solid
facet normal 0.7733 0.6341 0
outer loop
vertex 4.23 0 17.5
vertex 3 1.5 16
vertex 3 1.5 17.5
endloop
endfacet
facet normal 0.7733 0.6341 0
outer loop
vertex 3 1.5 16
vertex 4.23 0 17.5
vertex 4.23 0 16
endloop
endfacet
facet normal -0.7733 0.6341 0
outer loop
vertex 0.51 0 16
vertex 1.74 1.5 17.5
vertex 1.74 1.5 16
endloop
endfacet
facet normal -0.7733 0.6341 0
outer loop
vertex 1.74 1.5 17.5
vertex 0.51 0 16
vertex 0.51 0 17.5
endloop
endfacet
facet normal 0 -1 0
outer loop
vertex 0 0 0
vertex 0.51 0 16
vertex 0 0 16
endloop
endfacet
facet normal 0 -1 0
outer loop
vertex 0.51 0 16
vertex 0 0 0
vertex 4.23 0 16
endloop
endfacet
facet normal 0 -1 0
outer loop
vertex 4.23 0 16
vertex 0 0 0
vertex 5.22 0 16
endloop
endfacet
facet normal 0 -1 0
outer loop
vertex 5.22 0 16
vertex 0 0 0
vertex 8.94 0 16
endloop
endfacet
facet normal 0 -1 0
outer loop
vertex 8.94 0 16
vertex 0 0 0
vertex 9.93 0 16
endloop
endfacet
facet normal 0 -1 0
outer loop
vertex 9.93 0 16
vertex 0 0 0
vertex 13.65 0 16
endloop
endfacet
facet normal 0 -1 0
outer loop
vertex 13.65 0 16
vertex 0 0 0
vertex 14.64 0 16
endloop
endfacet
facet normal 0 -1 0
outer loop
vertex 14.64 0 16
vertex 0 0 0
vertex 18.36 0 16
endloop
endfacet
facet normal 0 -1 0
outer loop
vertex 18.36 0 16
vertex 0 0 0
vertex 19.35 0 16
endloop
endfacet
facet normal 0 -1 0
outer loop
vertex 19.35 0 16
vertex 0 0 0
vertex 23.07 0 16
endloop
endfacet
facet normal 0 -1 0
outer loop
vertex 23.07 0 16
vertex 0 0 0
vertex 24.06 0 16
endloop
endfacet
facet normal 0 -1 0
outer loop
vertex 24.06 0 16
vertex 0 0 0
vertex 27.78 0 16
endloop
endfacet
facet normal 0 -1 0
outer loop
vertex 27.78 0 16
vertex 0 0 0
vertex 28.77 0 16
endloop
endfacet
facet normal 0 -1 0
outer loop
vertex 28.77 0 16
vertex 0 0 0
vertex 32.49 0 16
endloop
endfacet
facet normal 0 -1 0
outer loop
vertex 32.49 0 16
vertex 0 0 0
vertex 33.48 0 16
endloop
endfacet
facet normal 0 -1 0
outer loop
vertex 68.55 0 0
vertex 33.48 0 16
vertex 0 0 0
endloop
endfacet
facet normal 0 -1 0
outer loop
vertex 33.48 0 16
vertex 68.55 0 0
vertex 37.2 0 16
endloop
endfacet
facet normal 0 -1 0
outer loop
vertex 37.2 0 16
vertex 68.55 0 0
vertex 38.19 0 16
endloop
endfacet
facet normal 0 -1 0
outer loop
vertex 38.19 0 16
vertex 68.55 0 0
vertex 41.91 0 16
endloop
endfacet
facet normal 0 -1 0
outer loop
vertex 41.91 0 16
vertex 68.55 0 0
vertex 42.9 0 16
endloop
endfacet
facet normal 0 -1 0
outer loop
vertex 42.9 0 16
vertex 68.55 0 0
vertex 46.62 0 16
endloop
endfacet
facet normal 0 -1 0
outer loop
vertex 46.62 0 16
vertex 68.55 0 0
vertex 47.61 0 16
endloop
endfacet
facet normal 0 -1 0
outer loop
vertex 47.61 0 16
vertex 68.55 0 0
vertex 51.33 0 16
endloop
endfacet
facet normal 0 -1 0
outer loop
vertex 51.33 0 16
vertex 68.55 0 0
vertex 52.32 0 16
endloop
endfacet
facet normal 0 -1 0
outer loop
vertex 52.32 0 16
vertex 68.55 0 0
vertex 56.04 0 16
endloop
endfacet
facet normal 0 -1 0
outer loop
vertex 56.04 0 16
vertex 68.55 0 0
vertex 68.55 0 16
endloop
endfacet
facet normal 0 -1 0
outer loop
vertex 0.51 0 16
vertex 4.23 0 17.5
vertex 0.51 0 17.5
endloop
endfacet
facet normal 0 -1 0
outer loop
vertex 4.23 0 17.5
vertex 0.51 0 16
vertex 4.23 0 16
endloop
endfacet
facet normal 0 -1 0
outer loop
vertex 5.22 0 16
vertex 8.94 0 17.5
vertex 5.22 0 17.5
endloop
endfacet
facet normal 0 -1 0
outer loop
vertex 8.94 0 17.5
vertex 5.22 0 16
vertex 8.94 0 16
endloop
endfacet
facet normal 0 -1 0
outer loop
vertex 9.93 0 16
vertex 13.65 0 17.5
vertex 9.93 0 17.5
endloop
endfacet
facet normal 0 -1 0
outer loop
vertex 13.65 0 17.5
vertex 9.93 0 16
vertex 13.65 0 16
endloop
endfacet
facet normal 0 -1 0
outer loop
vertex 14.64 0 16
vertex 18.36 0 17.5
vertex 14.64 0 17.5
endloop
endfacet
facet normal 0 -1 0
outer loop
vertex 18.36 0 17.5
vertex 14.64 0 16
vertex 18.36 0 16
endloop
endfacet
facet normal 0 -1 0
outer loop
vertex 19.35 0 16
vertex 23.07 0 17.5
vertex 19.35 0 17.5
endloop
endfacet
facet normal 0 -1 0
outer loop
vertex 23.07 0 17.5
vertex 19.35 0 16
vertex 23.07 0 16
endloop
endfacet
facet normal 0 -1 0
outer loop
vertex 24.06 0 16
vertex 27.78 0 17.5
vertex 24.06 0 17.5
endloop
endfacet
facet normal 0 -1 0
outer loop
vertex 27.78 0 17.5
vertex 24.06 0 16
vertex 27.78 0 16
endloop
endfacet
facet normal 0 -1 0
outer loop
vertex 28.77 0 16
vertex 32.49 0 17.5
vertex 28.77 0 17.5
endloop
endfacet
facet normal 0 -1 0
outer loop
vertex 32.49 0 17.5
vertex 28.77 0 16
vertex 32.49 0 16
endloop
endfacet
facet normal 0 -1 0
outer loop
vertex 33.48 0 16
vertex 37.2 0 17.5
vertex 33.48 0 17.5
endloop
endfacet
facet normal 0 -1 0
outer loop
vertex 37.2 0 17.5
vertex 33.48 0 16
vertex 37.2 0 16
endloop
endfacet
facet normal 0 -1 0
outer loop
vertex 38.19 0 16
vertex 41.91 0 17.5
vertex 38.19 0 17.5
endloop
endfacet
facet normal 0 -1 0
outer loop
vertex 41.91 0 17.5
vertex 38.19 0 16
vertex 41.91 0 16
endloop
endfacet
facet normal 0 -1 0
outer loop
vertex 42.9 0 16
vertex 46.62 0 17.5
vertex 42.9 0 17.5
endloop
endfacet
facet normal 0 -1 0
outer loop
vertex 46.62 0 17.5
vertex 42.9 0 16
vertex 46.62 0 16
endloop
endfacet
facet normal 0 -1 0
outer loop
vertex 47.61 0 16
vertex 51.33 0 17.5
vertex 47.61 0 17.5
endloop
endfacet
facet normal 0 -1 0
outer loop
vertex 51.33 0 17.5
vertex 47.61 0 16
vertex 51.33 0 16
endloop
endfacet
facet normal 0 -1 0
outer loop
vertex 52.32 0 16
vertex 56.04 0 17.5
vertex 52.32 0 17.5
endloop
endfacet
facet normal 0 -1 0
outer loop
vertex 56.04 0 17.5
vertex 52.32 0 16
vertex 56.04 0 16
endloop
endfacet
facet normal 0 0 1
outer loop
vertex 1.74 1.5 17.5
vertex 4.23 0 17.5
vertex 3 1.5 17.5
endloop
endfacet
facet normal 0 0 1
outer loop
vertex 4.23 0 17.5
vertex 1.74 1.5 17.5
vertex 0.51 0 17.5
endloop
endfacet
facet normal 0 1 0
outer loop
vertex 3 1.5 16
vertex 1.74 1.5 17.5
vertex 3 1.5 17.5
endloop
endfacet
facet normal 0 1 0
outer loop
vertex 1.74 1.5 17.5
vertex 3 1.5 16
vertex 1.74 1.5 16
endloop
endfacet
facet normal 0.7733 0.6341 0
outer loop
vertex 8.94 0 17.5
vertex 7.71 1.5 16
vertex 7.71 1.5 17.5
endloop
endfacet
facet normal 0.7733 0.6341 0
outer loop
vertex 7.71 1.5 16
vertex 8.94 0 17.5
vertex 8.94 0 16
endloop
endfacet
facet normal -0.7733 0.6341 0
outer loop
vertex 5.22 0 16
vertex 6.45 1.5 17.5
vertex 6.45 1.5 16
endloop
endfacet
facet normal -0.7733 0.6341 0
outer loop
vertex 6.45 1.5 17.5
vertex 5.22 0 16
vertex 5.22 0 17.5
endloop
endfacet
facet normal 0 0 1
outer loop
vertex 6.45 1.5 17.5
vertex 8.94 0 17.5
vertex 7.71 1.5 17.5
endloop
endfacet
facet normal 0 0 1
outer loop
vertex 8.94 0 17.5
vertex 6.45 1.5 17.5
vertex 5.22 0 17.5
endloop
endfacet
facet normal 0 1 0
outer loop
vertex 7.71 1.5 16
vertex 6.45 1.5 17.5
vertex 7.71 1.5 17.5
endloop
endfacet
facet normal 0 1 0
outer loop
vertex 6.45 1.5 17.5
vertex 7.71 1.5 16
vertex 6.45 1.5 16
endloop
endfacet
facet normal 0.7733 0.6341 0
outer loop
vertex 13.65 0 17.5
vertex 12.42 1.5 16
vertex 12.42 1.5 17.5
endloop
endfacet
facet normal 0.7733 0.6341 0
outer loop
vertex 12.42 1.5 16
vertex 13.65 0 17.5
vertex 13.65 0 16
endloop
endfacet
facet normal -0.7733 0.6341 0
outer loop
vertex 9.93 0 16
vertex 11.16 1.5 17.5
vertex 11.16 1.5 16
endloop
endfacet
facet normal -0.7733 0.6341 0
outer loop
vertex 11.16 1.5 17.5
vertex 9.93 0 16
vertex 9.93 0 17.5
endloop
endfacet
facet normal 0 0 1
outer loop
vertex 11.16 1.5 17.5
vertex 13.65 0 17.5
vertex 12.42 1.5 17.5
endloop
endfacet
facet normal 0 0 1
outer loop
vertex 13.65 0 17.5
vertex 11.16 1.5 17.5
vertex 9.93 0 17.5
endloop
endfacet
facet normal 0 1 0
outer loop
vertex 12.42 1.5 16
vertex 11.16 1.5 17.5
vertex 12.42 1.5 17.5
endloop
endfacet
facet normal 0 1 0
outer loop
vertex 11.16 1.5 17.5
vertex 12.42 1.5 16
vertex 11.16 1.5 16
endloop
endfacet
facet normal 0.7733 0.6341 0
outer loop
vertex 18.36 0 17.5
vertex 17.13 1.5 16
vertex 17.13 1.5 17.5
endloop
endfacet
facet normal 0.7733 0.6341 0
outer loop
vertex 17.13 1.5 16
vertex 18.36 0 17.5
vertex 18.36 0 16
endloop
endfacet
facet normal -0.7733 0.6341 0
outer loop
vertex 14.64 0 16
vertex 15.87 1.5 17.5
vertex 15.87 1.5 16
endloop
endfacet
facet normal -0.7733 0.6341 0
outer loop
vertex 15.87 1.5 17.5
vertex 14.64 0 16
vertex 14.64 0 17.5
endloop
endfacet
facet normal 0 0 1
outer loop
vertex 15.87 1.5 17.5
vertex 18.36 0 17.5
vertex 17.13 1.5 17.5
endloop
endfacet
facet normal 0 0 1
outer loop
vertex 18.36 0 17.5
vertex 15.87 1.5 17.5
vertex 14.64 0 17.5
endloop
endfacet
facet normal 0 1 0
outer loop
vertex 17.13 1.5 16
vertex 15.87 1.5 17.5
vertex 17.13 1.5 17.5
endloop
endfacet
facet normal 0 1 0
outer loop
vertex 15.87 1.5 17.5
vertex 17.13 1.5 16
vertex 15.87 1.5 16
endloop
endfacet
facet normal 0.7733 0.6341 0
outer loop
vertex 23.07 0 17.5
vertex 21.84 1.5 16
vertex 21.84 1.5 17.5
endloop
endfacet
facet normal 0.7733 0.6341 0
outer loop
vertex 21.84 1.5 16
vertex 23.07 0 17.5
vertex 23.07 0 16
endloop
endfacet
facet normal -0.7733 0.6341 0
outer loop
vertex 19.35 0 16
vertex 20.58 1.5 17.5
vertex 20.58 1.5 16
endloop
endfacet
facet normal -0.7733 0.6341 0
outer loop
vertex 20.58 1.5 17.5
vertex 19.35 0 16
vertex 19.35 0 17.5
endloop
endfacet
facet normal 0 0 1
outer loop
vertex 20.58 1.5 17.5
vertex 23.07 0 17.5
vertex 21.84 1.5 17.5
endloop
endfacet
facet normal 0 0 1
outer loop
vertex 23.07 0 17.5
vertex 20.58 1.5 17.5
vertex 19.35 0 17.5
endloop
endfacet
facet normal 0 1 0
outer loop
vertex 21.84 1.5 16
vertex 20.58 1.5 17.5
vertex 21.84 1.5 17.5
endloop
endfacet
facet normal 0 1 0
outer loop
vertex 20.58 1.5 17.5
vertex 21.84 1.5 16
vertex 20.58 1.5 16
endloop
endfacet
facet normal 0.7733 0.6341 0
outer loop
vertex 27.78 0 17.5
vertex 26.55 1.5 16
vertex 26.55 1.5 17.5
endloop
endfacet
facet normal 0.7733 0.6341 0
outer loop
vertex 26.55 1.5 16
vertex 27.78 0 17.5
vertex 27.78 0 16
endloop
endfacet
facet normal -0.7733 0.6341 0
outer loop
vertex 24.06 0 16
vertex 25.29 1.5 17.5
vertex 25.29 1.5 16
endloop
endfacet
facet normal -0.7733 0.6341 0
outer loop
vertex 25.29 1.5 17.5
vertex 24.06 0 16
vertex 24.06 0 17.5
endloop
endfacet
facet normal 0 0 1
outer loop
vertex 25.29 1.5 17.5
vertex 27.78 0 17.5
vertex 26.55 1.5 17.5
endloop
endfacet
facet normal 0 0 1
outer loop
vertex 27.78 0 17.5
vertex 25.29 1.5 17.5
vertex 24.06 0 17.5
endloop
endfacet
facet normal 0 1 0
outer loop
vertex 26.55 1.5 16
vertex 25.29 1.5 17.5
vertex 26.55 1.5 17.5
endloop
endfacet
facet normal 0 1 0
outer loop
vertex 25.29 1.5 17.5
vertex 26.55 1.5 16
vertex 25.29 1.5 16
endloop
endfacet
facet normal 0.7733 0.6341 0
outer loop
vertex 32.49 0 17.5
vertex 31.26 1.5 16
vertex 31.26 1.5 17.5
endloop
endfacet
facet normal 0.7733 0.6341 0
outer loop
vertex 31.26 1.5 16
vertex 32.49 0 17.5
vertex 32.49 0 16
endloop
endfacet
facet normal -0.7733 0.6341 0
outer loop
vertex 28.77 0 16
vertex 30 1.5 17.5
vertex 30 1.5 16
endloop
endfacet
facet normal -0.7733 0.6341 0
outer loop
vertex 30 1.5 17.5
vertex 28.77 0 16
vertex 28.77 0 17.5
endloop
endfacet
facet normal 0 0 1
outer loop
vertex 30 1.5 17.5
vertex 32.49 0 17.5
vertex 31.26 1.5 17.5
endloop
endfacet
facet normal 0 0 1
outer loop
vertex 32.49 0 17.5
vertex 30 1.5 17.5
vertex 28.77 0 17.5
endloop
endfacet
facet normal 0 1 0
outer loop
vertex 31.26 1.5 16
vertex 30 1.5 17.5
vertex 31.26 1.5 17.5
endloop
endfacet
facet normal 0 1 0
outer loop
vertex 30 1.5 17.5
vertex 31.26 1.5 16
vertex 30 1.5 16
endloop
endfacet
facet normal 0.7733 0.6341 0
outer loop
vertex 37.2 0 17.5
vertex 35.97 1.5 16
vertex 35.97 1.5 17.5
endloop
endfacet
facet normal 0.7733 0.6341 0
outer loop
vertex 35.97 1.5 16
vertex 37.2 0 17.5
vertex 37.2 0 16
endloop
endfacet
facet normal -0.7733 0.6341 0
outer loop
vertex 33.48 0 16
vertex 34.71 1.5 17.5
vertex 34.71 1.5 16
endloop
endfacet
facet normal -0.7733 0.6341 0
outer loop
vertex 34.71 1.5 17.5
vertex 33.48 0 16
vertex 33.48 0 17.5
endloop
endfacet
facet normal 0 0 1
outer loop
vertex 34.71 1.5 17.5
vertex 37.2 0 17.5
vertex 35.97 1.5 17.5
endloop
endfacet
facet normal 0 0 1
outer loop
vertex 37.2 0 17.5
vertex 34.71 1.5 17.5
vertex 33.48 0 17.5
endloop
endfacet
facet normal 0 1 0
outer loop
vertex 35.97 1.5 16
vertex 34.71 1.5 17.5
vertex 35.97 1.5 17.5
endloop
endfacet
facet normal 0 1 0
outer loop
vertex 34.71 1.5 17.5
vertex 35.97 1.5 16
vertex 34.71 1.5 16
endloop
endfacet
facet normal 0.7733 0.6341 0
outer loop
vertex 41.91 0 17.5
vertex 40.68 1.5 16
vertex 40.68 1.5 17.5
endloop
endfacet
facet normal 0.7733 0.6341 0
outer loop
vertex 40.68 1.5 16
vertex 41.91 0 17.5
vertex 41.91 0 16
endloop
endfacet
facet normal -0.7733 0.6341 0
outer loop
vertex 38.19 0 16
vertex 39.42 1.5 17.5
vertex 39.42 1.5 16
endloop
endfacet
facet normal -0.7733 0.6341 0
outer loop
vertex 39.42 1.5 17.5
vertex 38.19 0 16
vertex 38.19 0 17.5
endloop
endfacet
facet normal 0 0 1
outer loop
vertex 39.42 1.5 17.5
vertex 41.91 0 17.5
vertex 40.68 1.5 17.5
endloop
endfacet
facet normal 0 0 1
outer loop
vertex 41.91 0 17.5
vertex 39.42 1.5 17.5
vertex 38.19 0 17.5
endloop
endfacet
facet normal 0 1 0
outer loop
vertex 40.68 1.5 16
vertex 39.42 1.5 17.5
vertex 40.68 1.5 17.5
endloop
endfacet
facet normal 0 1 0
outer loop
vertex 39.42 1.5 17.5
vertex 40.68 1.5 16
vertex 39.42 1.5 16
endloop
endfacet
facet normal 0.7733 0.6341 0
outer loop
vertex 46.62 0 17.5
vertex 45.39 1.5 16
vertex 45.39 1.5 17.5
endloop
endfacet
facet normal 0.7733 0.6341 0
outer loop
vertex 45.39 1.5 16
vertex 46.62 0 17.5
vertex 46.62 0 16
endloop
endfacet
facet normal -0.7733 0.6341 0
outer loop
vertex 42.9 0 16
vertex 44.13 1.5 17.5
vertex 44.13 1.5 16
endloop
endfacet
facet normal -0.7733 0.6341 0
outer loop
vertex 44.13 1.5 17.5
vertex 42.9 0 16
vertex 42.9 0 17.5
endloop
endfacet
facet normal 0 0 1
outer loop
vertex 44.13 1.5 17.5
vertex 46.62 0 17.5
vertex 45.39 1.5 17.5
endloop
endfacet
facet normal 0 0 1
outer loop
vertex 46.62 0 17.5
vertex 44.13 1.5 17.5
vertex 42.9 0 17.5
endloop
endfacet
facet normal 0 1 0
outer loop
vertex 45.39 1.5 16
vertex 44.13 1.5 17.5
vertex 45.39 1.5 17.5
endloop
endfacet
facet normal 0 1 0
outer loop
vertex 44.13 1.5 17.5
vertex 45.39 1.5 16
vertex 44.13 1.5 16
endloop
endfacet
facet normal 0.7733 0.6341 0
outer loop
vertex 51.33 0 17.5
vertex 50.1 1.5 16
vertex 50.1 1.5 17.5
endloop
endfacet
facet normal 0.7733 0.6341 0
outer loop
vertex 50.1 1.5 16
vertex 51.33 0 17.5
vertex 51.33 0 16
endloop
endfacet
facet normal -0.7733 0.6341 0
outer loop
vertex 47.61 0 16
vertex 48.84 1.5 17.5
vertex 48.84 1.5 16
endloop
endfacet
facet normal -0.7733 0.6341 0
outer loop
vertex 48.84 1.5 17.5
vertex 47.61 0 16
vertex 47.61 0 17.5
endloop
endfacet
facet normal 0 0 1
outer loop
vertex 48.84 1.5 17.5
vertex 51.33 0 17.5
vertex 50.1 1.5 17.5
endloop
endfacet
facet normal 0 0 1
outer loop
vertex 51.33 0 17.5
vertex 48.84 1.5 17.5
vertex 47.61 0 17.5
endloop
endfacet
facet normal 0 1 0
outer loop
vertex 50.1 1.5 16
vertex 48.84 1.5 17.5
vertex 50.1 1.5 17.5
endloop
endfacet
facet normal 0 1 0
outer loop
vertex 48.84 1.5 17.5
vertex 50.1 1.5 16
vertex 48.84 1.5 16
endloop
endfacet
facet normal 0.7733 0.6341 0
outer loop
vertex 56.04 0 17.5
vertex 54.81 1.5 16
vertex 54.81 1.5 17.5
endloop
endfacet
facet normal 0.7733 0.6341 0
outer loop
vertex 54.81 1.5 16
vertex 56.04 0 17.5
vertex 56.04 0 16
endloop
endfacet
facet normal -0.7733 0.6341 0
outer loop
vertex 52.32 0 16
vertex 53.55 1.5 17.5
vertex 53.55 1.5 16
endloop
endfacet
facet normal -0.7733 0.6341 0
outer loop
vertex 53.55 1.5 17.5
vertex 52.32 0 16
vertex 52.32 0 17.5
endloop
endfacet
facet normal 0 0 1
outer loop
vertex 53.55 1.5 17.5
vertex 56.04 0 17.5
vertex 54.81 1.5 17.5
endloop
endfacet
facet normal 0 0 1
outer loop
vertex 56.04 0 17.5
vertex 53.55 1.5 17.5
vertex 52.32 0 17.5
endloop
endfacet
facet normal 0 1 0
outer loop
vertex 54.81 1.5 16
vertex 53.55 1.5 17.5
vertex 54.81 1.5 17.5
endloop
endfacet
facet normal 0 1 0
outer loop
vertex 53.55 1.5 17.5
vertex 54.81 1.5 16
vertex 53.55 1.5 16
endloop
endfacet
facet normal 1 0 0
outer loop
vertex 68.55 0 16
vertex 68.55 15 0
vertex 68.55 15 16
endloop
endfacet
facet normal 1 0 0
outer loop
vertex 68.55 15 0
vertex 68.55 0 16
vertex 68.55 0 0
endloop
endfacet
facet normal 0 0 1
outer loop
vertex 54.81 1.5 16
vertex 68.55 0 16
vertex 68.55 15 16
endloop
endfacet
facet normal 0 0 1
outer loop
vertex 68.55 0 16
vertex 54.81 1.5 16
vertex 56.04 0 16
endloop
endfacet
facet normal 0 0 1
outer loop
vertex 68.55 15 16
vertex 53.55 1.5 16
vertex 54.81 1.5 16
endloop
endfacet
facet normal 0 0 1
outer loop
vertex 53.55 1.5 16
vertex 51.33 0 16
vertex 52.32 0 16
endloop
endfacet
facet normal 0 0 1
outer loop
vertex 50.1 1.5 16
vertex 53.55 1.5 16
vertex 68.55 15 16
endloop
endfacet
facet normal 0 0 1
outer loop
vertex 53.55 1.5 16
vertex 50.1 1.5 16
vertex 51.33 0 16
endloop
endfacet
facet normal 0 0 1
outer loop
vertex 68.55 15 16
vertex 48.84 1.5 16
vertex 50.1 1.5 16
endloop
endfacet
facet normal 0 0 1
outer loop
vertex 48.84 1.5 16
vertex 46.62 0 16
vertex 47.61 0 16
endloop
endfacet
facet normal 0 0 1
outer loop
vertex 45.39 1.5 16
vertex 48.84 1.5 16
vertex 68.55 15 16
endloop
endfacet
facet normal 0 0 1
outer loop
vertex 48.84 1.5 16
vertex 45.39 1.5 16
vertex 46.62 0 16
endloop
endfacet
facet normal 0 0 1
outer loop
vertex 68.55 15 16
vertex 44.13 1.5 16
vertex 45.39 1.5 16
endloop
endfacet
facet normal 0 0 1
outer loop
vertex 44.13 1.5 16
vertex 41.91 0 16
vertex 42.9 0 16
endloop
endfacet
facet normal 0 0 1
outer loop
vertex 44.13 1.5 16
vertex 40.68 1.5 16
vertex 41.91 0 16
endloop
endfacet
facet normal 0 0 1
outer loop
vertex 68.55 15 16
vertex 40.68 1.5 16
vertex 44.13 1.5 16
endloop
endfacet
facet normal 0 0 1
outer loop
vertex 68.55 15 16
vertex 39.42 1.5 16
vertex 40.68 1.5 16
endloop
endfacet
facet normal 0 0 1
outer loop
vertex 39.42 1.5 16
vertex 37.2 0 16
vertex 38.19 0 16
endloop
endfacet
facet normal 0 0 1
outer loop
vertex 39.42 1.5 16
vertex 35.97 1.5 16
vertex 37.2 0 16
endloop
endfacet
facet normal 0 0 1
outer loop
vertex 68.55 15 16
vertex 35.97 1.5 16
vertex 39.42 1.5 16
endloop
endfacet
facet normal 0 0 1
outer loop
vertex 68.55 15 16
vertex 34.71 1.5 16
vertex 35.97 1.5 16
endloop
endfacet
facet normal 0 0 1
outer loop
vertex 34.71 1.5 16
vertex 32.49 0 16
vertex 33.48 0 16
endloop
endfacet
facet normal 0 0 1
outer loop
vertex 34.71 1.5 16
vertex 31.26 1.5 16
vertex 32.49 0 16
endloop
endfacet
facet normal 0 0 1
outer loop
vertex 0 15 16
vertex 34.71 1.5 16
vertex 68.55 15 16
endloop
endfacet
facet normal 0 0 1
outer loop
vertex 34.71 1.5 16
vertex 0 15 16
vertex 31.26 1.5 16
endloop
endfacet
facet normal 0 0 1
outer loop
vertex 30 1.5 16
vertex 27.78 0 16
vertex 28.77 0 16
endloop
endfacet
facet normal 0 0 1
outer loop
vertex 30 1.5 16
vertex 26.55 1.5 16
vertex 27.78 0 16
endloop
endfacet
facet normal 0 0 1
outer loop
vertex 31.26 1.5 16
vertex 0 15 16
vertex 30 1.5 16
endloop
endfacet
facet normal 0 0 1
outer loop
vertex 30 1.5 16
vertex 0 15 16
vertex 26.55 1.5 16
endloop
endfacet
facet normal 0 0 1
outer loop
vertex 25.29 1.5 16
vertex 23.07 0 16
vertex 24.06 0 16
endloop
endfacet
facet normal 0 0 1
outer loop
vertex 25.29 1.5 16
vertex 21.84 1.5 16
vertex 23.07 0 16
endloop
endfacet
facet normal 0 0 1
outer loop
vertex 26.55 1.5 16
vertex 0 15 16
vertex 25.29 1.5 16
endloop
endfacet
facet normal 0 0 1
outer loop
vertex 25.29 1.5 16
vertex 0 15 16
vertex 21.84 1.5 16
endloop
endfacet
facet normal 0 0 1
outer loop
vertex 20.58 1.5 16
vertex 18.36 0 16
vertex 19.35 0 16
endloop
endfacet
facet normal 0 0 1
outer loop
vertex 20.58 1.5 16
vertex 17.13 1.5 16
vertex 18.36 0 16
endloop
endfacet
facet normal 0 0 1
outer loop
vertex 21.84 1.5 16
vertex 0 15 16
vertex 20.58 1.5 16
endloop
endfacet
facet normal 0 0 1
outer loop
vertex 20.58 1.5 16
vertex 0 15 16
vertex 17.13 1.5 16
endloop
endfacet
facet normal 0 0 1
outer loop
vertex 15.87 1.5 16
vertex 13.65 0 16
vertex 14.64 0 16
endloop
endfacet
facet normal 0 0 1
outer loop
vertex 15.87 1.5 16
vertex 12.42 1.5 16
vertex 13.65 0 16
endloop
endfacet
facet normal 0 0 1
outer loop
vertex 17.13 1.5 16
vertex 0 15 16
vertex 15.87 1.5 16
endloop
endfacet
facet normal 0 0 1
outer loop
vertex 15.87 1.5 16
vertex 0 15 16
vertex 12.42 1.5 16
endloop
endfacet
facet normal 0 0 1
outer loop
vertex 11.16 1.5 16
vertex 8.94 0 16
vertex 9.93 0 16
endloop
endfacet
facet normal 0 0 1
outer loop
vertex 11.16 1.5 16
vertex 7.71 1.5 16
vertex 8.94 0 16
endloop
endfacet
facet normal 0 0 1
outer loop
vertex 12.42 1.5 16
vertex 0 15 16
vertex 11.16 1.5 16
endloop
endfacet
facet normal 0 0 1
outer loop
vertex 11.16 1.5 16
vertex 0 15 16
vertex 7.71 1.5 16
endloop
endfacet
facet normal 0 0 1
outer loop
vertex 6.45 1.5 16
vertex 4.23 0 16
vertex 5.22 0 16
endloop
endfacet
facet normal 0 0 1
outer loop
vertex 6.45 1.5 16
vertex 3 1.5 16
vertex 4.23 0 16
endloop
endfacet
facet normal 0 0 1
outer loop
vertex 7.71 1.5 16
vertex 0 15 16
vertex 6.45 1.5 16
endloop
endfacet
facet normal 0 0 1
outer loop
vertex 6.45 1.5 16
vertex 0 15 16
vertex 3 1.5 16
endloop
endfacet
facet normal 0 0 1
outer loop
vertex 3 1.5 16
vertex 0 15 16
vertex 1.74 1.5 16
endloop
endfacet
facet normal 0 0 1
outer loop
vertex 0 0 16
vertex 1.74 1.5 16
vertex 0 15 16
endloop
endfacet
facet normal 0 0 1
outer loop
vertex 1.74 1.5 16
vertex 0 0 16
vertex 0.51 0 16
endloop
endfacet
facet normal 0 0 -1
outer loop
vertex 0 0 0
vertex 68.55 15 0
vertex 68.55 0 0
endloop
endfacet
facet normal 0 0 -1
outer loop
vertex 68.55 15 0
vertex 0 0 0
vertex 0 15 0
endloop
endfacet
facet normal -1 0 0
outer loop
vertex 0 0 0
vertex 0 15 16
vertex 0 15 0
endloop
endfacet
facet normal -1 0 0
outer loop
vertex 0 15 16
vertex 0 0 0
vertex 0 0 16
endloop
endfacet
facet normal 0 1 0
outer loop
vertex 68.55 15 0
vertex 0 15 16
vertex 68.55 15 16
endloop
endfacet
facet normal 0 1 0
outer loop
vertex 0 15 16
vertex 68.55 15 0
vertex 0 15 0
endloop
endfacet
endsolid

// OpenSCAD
$fn = 32;

// ----------------------------------------------------------------------
// Gear rack: m=1.5 z=12, 68.55 x 15 x 17.5 mm
// ----------------------------------------------------------------------

// --- parameters (mm) ---
bar_len = 68.55;          // rack length, X
bar_w = 15;               // rack width, Y
bar_h = 17.5;             // overall height, Z
gear_module = 1.5;        // module
base_t = 16;              // tooth root line height
pitch = 4.71;             // circular pitch
tip_w = 1.26;             // tooth thickness at the tip
root_w = 3.72;            // tooth thickness at the root line
sink = 0.6;               // tooth root overlap into the body

tooth_span = 56.55;

module tooth(x0) {
  /* 20 deg flank profile, sunk into the body for a positive overlap */
  translate([x0, 0, base_t - sink])
    linear_extrude(height = bar_h - base_t + sink)
      polygon(points = [[-root_w / 2, 0], [root_w / 2, 0],
                        [tip_w / 2, bar_h - base_t],
                        [-tip_w / 2, bar_h - base_t]]);
}

difference() {
  union() {
    cube([bar_len, bar_w, base_t]);
    for (i = [0 : 12 - 1])
      tooth((i + 0.5) * pitch + (tooth_span - 12 * pitch) / 2);
  }
}
